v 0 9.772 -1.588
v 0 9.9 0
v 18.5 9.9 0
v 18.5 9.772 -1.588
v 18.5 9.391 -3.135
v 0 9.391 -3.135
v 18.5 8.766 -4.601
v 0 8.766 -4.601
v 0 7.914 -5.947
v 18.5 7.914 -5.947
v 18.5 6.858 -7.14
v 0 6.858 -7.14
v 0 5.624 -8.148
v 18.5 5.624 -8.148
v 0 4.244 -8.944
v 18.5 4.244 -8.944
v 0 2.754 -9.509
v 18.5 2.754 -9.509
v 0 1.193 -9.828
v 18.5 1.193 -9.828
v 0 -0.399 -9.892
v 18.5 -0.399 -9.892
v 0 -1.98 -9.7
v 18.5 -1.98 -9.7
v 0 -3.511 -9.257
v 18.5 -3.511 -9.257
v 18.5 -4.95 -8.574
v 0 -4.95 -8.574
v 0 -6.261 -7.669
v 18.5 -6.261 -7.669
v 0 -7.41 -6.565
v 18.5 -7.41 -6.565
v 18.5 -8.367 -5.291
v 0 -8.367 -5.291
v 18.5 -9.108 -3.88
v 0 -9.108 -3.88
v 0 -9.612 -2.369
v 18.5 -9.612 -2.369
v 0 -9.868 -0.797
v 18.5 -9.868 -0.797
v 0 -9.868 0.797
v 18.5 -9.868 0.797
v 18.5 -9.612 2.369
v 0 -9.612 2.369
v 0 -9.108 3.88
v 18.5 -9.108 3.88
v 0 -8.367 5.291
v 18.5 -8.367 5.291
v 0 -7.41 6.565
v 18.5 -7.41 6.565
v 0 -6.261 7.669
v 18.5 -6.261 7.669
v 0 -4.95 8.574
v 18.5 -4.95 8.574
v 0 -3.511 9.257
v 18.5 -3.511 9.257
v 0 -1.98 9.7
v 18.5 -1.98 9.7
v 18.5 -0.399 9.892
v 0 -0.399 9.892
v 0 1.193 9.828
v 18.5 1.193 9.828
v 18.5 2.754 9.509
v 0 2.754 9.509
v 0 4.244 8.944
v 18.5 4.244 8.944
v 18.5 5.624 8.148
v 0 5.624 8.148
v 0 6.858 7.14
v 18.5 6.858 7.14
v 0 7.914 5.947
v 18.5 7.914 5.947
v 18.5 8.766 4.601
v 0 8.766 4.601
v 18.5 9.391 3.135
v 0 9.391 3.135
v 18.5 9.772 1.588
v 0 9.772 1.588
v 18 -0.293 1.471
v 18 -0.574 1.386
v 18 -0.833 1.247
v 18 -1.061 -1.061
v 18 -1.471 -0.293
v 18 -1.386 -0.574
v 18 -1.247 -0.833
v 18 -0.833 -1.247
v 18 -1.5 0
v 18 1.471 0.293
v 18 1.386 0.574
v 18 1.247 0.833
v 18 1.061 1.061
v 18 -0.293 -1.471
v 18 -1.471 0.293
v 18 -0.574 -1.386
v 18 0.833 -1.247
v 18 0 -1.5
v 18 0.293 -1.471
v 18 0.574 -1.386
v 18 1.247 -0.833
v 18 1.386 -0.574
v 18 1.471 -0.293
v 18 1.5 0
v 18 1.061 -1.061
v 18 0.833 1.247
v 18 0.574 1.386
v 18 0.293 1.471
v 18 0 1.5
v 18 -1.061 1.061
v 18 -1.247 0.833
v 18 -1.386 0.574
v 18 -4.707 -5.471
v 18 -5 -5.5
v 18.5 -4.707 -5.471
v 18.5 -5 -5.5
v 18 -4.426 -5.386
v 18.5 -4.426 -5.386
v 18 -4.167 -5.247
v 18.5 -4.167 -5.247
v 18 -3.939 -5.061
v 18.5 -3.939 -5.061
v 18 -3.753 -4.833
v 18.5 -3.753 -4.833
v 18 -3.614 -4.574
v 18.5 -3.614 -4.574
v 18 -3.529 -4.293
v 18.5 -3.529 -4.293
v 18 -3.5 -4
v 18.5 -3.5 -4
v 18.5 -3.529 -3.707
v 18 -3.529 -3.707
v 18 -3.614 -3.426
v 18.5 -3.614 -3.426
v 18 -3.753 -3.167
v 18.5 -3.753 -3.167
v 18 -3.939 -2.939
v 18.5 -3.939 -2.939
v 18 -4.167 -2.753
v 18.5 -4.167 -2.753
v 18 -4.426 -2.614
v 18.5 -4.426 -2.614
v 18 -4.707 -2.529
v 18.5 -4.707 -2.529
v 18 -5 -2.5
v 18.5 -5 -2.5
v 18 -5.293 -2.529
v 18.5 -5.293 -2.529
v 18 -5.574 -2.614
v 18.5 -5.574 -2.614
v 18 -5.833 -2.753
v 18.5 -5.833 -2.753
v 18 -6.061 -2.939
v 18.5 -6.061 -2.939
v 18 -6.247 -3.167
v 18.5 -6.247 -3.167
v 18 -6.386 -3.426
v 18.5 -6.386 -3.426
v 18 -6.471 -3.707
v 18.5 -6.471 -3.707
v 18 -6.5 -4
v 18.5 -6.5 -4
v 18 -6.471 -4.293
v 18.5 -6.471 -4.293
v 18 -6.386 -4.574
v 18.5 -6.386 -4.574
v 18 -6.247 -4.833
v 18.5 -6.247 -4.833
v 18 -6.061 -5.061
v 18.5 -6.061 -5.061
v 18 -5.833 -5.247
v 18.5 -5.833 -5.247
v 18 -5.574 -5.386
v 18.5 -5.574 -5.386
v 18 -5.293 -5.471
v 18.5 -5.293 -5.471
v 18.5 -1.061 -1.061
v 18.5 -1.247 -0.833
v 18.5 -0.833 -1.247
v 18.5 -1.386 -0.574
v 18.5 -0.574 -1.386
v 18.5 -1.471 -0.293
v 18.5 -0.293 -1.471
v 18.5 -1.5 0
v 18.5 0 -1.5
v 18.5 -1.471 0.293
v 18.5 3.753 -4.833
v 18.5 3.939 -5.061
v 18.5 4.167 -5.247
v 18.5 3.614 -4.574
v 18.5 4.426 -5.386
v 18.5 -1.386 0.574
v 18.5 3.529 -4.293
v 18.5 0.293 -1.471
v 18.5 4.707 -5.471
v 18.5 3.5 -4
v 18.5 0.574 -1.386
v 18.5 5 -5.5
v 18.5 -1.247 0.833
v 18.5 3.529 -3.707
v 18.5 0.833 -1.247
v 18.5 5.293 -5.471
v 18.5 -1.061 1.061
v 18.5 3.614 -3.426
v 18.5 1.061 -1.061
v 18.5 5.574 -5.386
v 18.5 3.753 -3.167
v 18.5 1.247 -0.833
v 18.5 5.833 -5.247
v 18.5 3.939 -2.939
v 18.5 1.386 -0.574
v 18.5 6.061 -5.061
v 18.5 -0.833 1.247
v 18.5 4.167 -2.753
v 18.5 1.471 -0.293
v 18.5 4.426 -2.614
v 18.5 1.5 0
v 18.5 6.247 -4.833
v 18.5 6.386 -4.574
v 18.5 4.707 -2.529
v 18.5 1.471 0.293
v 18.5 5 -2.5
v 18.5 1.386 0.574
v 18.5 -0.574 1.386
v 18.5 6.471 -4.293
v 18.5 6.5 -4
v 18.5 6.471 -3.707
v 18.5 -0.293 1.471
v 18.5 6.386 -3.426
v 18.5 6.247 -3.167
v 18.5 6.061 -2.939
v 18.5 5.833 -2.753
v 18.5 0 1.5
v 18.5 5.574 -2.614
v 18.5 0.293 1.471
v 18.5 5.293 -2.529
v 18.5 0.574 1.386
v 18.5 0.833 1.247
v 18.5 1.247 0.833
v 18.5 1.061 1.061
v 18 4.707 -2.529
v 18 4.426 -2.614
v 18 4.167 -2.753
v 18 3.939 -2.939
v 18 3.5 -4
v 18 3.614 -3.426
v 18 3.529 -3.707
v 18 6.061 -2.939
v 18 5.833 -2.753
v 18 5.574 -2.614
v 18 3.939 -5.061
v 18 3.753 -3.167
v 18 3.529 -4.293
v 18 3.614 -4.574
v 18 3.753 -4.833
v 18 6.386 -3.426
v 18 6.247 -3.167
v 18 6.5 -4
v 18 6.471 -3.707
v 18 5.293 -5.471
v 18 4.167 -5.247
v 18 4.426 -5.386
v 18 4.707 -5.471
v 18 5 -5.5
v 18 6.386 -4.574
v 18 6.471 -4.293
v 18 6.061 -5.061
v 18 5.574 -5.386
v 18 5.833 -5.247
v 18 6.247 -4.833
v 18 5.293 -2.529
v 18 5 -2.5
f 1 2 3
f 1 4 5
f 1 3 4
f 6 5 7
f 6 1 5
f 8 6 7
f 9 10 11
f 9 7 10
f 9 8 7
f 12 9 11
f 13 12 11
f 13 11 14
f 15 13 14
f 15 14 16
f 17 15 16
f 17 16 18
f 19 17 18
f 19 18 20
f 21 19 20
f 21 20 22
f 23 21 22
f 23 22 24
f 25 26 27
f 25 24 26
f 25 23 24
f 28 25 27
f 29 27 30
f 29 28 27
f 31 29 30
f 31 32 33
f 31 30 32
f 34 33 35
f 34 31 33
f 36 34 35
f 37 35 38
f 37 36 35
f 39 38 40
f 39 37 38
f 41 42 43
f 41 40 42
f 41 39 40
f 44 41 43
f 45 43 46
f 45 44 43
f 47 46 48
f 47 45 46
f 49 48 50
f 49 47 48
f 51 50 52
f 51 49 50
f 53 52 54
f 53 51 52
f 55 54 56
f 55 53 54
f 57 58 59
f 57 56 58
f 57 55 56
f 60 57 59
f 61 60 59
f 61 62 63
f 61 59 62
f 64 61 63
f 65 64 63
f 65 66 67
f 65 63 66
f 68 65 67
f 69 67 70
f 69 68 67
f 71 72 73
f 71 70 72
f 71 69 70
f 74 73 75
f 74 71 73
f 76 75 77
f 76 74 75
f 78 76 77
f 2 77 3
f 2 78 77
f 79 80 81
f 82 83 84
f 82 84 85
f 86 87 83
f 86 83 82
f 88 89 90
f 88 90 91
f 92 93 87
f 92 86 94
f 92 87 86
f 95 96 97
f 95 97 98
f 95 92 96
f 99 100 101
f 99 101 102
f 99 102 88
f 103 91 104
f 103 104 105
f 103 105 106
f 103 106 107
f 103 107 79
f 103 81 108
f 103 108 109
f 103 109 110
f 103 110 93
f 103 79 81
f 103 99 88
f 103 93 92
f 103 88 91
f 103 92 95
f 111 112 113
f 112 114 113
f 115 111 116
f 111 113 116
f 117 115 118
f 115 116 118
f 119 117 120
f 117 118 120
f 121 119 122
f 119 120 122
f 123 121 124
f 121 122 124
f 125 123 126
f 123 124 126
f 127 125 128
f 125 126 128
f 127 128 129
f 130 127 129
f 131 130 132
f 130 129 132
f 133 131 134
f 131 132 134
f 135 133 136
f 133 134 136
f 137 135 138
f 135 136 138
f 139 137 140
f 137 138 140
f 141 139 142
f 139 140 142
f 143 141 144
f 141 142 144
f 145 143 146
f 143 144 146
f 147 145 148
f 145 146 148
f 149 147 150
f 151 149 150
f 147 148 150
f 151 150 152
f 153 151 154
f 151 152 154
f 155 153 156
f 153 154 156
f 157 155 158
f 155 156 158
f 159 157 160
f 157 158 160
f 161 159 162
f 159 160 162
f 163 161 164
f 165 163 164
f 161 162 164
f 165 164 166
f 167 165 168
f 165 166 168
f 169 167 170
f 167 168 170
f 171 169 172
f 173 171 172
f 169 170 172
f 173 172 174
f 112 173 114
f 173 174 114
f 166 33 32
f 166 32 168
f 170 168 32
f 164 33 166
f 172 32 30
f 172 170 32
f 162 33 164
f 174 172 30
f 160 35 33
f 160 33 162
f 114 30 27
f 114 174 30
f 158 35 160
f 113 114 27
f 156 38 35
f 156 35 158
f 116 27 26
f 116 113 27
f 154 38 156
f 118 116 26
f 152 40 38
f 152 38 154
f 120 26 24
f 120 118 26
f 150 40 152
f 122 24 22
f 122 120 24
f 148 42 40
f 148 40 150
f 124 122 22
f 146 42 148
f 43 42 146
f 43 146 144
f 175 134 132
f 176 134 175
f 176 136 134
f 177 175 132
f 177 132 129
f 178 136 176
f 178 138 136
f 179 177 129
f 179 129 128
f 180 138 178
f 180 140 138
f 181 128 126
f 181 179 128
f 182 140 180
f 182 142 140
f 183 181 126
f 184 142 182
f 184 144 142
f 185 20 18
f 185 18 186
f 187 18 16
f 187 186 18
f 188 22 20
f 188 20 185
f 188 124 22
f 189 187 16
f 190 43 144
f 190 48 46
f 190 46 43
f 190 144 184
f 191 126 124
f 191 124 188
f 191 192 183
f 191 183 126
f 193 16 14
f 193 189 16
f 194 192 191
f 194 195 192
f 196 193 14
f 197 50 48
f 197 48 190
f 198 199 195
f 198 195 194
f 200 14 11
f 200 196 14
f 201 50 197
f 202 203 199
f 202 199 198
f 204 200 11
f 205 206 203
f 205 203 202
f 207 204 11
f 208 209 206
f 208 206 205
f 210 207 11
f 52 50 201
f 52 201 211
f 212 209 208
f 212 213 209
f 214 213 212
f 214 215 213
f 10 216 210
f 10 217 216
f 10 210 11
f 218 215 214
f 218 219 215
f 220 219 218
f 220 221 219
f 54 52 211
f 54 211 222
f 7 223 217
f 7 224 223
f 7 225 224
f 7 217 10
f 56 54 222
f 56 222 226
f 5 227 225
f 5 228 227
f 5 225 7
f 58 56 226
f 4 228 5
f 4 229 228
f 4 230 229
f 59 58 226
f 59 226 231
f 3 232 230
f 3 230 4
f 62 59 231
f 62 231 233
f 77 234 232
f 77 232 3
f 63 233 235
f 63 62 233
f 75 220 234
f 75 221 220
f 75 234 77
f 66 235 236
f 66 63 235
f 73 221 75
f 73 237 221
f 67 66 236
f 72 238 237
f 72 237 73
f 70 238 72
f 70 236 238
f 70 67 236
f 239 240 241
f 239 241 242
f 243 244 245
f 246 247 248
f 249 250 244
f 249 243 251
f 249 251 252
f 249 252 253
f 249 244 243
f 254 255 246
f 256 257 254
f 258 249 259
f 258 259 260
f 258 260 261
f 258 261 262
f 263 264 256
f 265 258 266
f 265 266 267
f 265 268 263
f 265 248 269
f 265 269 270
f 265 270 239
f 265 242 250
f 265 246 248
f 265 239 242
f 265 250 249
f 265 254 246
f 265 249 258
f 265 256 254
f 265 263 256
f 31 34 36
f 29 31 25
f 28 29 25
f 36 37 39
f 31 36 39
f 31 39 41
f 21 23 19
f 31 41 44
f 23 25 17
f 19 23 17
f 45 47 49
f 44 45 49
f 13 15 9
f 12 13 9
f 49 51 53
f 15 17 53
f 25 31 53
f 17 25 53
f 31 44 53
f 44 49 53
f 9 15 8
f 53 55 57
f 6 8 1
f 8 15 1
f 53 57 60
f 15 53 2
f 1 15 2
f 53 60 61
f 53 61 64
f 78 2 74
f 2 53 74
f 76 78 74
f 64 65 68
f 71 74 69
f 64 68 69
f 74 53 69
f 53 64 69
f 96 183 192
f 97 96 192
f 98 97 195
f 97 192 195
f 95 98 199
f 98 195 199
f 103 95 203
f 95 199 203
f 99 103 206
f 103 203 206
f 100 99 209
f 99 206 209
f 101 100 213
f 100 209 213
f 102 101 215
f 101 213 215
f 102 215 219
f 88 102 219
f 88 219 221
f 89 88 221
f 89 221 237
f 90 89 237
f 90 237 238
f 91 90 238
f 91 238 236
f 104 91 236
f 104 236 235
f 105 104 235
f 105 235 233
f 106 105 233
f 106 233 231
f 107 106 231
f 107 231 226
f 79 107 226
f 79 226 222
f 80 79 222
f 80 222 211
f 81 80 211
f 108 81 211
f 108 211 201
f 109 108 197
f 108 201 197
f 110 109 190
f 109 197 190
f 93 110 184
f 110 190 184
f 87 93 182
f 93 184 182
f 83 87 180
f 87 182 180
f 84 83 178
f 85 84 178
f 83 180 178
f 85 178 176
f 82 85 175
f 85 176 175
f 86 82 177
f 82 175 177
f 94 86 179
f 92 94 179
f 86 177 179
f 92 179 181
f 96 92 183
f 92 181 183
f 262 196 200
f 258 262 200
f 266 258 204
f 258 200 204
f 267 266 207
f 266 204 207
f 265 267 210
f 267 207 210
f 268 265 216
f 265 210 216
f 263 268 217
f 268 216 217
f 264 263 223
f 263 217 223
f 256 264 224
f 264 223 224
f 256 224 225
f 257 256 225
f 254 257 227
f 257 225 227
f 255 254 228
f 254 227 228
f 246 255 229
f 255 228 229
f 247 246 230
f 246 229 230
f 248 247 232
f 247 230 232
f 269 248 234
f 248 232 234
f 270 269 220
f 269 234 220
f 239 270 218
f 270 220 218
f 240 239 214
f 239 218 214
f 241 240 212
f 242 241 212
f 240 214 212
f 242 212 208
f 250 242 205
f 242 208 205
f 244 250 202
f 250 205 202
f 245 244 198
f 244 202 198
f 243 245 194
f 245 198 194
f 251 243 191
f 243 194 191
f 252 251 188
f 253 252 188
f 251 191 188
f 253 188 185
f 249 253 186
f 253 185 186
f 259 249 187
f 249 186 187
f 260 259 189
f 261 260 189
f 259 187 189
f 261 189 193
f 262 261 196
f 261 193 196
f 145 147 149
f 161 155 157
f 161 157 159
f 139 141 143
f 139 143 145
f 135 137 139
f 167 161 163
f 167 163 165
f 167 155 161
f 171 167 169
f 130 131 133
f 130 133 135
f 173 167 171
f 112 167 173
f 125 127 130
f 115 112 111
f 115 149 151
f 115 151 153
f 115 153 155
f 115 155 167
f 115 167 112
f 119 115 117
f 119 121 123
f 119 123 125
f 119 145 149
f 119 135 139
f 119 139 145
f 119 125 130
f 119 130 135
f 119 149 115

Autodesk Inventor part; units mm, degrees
ref_plane "YZ Plane" through (0, 0, 0) normal (1, 0, 0) x (0, 1, 0)
ref_plane "XZ Plane" through (0, 0, 0) normal (0, 1, 0) x (-1, 0, 0)
ref_plane "XY Plane" through (0, 0, 0) normal (0, 0, 1) x (1, 0, 0)
sketch "スケッチ1" plane through (0, 0, 0) normal (0, 0, 1) x (1, 0, 0)
  point P0 (0, 0)
sketch "スケッチ2" plane through (0, 0, 0) normal (1, 0, 0) x (0, 1, 0)
  circle A0 centre (0, 0) radius 9.9
  dimension "d0" = 19.8
extrude "押し出し1" add sketch "スケッチ2" along normal blind 18.5
sketch "スケッチ3" plane through (18.5, 0, 0) normal (1, 0, 0) x (0, 0, -1)
  circle A0 centre (0, 0) radius 1.5
  dimension "d3" = 3
extrude "押し出し2" cut sketch "スケッチ3" against normal blind 0.5
sketch "スケッチ4" plane through (18.5, 0, 0) normal (1, 0, 0) x (0, 0, -1)
  circle A0 centre (4, 5) radius 1.5
  circle A1 centre (4, -5) radius 1.5
  point P0 (0, 0)
  dimension "d6" = 3
  dimension "d7" = 3
extrude "押し出し3" cut sketch "スケッチ4" against normal blind 0.5
properties part number "stepping_motor" material "アルミニウム"
